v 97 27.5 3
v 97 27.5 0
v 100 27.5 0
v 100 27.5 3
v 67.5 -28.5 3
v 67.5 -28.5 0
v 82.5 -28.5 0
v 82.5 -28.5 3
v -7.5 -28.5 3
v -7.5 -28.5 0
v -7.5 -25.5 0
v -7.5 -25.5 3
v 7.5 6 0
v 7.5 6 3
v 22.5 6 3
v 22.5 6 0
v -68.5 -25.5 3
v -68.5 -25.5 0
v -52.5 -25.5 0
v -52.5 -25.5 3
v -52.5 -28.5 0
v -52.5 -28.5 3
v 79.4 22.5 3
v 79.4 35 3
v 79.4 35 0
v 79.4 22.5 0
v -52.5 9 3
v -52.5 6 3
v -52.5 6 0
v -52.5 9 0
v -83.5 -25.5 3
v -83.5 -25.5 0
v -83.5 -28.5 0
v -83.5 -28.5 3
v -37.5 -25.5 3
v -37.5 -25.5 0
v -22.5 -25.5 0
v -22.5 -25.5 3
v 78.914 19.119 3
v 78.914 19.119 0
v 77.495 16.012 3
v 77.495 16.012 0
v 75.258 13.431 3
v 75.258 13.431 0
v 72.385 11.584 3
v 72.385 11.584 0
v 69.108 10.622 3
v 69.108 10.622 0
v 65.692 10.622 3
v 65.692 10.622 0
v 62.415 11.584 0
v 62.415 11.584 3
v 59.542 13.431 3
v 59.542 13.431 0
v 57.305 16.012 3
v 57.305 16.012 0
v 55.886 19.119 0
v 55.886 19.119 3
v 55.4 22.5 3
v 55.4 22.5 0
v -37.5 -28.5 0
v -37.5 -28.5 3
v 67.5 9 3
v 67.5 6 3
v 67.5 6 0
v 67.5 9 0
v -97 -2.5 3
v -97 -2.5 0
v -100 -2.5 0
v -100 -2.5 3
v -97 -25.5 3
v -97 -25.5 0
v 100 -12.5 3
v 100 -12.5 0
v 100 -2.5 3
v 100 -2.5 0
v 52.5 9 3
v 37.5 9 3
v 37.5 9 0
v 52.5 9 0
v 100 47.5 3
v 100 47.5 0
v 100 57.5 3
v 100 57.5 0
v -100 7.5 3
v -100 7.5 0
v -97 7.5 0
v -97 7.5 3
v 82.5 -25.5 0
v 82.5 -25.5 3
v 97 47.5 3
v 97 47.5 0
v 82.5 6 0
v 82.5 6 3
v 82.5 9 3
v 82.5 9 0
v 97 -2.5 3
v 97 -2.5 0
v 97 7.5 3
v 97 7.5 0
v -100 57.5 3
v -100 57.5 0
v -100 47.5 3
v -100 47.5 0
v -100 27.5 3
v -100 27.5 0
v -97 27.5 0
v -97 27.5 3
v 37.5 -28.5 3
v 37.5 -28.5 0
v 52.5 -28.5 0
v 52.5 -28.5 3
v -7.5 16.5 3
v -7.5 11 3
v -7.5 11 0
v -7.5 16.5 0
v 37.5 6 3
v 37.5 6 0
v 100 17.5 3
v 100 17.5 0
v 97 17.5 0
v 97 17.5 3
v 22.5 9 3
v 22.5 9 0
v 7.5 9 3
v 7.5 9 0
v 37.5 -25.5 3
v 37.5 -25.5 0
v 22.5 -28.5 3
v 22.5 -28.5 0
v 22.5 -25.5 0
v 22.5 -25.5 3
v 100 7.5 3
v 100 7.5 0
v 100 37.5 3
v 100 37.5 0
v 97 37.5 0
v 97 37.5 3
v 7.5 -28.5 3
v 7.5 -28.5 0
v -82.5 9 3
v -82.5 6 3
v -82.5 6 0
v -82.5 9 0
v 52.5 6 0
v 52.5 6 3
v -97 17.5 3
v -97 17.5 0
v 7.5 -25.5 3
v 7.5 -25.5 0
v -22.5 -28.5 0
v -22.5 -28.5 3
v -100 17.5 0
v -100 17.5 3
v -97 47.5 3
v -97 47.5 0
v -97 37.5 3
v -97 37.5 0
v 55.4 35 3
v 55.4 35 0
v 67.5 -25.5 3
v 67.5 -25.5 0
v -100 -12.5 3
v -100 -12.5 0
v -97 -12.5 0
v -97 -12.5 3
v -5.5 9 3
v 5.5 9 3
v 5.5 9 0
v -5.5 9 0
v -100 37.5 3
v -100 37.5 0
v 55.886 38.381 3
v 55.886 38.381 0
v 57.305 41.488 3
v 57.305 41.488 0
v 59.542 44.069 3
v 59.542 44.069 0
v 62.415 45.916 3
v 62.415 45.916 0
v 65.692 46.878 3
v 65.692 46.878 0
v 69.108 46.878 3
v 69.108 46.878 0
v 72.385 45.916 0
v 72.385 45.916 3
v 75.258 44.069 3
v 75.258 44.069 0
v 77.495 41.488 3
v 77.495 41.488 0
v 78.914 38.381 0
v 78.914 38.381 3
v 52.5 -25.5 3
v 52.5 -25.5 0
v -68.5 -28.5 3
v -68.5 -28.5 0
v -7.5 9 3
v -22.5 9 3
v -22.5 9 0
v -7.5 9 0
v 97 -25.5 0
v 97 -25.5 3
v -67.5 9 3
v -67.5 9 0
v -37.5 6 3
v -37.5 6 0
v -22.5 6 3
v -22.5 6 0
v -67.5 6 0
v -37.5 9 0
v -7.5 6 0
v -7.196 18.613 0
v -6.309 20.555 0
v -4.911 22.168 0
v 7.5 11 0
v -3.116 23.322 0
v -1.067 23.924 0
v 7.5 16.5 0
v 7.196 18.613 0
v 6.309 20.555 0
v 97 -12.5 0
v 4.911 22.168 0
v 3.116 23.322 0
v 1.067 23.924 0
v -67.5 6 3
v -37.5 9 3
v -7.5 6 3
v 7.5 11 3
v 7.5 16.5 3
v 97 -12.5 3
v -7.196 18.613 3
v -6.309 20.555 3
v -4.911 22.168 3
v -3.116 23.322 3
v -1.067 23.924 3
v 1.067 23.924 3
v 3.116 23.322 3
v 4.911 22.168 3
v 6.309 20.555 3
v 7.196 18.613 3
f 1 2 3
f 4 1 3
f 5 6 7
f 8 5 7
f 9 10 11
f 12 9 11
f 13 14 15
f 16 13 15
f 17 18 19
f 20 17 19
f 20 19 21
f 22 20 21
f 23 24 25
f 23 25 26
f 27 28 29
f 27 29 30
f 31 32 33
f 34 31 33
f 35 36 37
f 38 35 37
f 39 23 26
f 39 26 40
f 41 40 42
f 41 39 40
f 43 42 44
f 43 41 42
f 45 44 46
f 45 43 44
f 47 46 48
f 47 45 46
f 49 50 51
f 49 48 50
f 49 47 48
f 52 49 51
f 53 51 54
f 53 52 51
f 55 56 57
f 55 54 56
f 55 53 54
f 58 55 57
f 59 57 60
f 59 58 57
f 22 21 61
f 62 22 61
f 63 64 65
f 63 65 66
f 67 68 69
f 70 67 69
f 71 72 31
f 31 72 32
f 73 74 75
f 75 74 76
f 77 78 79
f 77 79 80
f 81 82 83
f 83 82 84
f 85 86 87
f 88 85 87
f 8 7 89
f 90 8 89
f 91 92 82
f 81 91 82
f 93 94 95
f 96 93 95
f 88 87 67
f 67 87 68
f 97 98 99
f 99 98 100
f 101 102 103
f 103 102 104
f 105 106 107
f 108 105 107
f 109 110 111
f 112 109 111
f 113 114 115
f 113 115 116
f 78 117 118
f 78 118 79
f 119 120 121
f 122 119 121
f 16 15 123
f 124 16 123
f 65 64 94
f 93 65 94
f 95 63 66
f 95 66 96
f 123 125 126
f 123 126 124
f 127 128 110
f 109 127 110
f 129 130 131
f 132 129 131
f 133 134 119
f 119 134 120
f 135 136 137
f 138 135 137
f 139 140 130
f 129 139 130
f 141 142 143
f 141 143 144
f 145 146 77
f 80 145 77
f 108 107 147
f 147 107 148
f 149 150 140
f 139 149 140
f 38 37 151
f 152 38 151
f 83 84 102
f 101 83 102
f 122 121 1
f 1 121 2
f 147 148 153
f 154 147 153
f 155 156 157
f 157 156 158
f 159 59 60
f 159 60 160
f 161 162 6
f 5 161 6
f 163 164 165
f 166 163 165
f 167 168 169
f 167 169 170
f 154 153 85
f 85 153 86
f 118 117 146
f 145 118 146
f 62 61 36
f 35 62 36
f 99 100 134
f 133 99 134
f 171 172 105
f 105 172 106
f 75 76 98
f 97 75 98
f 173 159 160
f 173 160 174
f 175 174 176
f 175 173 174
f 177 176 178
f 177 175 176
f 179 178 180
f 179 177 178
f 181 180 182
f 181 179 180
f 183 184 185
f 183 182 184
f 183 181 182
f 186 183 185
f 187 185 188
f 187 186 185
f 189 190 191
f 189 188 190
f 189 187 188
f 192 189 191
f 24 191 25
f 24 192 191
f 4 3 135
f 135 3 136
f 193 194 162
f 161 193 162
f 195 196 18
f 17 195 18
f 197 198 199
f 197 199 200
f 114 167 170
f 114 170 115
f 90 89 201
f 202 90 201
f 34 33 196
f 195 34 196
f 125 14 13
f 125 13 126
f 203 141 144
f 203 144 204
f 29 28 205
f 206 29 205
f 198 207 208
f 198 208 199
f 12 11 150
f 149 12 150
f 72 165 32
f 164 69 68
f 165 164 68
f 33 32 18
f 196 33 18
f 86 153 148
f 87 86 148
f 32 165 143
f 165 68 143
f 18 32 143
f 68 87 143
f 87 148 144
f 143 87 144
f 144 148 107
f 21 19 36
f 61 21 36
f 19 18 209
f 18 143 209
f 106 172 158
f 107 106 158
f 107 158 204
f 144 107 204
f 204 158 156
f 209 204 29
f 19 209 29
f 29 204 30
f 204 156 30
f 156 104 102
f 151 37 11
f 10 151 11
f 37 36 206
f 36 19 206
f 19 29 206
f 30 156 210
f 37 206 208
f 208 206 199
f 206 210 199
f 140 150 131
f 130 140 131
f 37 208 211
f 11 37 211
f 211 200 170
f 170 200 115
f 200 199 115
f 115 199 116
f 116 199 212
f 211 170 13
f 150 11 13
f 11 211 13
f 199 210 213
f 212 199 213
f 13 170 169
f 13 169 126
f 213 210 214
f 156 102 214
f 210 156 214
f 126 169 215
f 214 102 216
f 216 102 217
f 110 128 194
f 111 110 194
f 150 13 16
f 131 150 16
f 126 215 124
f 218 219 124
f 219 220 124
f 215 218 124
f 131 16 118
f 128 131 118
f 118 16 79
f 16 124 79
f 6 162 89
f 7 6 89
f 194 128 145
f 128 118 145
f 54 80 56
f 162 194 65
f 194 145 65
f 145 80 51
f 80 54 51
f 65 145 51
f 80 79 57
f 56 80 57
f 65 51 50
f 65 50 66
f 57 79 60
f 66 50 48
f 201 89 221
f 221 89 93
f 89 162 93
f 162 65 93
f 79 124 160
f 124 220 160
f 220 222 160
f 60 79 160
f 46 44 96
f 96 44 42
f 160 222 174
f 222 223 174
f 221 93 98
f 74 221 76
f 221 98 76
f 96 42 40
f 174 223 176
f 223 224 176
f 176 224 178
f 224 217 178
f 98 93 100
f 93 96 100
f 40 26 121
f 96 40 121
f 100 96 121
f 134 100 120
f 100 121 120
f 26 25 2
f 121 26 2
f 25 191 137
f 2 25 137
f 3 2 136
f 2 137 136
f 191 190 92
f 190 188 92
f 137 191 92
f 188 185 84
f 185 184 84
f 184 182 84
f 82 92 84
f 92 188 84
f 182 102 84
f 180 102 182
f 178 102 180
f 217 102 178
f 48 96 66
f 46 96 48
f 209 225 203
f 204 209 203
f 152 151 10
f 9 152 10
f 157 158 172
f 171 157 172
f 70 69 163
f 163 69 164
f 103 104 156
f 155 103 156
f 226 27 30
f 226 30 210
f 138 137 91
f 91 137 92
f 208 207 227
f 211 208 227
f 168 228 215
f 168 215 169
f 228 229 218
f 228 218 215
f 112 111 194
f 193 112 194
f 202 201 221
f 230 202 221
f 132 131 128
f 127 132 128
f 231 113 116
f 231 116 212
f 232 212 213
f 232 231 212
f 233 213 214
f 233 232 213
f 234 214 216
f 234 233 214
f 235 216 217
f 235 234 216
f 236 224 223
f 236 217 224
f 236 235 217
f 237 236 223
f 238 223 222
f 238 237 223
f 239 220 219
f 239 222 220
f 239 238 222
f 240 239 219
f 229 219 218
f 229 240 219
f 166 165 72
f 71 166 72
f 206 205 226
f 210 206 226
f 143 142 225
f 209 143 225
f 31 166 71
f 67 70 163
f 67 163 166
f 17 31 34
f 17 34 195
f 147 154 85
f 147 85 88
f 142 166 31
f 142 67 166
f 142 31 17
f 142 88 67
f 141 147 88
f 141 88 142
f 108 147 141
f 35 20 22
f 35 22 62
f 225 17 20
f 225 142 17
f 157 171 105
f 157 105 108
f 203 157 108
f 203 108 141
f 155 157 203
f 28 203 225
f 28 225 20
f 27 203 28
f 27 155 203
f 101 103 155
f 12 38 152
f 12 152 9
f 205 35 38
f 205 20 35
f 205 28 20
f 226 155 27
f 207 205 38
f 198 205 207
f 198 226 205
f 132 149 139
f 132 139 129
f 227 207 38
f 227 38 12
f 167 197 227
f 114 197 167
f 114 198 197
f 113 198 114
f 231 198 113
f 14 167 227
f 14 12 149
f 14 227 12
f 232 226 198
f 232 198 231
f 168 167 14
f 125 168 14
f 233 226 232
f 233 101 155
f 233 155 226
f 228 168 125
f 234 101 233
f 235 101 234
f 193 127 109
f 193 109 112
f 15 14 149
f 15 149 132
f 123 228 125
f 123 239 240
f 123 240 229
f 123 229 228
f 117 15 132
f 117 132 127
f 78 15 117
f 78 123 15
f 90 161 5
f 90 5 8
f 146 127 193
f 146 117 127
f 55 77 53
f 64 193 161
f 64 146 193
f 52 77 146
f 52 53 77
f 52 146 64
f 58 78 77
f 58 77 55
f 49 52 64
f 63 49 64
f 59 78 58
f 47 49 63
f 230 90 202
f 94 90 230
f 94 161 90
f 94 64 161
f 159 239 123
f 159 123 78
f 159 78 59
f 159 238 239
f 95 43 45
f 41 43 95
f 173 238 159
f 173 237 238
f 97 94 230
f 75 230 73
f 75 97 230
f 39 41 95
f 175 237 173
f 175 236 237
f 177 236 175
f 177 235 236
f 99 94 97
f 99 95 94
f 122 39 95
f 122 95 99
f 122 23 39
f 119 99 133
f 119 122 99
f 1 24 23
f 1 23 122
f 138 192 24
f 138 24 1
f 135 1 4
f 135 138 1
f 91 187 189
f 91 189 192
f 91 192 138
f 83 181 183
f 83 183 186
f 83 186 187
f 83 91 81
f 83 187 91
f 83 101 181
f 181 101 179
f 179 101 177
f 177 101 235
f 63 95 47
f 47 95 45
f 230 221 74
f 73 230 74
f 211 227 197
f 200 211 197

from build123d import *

# Parameters (mm, degrees)
BOSS_EXTRUDE1_DEPTH = 3
SKETCH2_W           = 15
SKETCH2_H           = 3
CUT_EXTRUDE1_DEPTH  = 10


with BuildPart() as part:
    # Sketch1 → Boss-Extrude1 (new body)
    with BuildSketch(Plane.XY):
        Polygon((-97, -12.5), (-97, -25.5), (-83.5, -25.5), (-83.5, -28.5), (-68.5, -28.5), (-68.5, -25.5), (-52.5, -25.5), (-52.5, -28.5), (-37.5, -28.5), (-37.5, -25.5), (-22.5, -25.5), (-22.5, -28.5), (-7.5, -28.5), (-7.5, -25.5), (0, -25.5), (7.5, -25.5), (7.5, -28.5), (22.5, -28.5), (22.5, -25.5), (30, -25.5), (37.5, -25.5), (37.5, -28.5), (52.5, -28.5), (52.5, -25.5), (60, -25.5), (67.5, -25.5), (67.5, -28.5), (82.5, -28.5), (82.5, -25.5), (97, -25.5), (97, -12.5), (100, -12.5), (100, -2.5), (97, -2.5), (97, 7.5), (100, 7.5), (100, 17.5), (97, 17.5), (97, 27.5), (100, 27.5), (100, 37.5), (97, 37.5), (97, 47.5), (100, 47.5), (100, 57.5), (97, 57.5), (-97, 57.5), (-100, 57.5), (-100, 47.5), (-97, 47.5), (-97, 37.5), (-100, 37.5), (-100, 27.5), (-97, 27.5), (-97, 17.5), (-100, 17.5), (-100, 7.5), (-97, 7.5), (-97, -2.5), (-100, -2.5), (-100, -12.5), align=None)
    extrude(amount=BOSS_EXTRUDE1_DEPTH)

    # Sketch2 → Cut-Extrude1 (cut)
    with BuildSketch(Plane.XY.offset(3)):
        with BuildLine():
            Line((55.4, 22.5), (55.4, 35))
            ThreePointArc((55.4, 35), (67.4, 47), (79.4, 35))
            Line((79.4, 35), (79.4, 22.5))
            ThreePointArc((79.4, 22.5), (67.4, 10.5), (55.4, 22.5))
        make_face()
        with Locations((15, 7.5)):
            Rectangle(SKETCH2_W, SKETCH2_H)
        with Locations((45, 7.5)):
            Rectangle(SKETCH2_W, SKETCH2_H)
        with Locations((75, 7.5)):
            Rectangle(SKETCH2_W, SKETCH2_H)
        with Locations((-75, 7.5)):
            Rectangle(SKETCH2_W, SKETCH2_H)
        with Locations((-45, 7.5)):
            Rectangle(SKETCH2_W, SKETCH2_H)
        with Locations((-15, 7.5)):
            Rectangle(SKETCH2_W, SKETCH2_H)
        with BuildLine():
            Line((-7.5, 11), (-7.5, 16.5))
            ThreePointArc((-7.5, 16.5), (0, 24), (7.5, 16.5))
            Line((7.5, 16.5), (7.5, 11))
            Line((7.5, 11), (5.5, 9))
            Line((5.5, 9), (-5.5, 9))
            Line((-5.5, 9), (-7.5, 11))
        make_face()
    extrude(amount=-CUT_EXTRUDE1_DEPTH, mode=Mode.SUBTRACT)


solid = part.part
